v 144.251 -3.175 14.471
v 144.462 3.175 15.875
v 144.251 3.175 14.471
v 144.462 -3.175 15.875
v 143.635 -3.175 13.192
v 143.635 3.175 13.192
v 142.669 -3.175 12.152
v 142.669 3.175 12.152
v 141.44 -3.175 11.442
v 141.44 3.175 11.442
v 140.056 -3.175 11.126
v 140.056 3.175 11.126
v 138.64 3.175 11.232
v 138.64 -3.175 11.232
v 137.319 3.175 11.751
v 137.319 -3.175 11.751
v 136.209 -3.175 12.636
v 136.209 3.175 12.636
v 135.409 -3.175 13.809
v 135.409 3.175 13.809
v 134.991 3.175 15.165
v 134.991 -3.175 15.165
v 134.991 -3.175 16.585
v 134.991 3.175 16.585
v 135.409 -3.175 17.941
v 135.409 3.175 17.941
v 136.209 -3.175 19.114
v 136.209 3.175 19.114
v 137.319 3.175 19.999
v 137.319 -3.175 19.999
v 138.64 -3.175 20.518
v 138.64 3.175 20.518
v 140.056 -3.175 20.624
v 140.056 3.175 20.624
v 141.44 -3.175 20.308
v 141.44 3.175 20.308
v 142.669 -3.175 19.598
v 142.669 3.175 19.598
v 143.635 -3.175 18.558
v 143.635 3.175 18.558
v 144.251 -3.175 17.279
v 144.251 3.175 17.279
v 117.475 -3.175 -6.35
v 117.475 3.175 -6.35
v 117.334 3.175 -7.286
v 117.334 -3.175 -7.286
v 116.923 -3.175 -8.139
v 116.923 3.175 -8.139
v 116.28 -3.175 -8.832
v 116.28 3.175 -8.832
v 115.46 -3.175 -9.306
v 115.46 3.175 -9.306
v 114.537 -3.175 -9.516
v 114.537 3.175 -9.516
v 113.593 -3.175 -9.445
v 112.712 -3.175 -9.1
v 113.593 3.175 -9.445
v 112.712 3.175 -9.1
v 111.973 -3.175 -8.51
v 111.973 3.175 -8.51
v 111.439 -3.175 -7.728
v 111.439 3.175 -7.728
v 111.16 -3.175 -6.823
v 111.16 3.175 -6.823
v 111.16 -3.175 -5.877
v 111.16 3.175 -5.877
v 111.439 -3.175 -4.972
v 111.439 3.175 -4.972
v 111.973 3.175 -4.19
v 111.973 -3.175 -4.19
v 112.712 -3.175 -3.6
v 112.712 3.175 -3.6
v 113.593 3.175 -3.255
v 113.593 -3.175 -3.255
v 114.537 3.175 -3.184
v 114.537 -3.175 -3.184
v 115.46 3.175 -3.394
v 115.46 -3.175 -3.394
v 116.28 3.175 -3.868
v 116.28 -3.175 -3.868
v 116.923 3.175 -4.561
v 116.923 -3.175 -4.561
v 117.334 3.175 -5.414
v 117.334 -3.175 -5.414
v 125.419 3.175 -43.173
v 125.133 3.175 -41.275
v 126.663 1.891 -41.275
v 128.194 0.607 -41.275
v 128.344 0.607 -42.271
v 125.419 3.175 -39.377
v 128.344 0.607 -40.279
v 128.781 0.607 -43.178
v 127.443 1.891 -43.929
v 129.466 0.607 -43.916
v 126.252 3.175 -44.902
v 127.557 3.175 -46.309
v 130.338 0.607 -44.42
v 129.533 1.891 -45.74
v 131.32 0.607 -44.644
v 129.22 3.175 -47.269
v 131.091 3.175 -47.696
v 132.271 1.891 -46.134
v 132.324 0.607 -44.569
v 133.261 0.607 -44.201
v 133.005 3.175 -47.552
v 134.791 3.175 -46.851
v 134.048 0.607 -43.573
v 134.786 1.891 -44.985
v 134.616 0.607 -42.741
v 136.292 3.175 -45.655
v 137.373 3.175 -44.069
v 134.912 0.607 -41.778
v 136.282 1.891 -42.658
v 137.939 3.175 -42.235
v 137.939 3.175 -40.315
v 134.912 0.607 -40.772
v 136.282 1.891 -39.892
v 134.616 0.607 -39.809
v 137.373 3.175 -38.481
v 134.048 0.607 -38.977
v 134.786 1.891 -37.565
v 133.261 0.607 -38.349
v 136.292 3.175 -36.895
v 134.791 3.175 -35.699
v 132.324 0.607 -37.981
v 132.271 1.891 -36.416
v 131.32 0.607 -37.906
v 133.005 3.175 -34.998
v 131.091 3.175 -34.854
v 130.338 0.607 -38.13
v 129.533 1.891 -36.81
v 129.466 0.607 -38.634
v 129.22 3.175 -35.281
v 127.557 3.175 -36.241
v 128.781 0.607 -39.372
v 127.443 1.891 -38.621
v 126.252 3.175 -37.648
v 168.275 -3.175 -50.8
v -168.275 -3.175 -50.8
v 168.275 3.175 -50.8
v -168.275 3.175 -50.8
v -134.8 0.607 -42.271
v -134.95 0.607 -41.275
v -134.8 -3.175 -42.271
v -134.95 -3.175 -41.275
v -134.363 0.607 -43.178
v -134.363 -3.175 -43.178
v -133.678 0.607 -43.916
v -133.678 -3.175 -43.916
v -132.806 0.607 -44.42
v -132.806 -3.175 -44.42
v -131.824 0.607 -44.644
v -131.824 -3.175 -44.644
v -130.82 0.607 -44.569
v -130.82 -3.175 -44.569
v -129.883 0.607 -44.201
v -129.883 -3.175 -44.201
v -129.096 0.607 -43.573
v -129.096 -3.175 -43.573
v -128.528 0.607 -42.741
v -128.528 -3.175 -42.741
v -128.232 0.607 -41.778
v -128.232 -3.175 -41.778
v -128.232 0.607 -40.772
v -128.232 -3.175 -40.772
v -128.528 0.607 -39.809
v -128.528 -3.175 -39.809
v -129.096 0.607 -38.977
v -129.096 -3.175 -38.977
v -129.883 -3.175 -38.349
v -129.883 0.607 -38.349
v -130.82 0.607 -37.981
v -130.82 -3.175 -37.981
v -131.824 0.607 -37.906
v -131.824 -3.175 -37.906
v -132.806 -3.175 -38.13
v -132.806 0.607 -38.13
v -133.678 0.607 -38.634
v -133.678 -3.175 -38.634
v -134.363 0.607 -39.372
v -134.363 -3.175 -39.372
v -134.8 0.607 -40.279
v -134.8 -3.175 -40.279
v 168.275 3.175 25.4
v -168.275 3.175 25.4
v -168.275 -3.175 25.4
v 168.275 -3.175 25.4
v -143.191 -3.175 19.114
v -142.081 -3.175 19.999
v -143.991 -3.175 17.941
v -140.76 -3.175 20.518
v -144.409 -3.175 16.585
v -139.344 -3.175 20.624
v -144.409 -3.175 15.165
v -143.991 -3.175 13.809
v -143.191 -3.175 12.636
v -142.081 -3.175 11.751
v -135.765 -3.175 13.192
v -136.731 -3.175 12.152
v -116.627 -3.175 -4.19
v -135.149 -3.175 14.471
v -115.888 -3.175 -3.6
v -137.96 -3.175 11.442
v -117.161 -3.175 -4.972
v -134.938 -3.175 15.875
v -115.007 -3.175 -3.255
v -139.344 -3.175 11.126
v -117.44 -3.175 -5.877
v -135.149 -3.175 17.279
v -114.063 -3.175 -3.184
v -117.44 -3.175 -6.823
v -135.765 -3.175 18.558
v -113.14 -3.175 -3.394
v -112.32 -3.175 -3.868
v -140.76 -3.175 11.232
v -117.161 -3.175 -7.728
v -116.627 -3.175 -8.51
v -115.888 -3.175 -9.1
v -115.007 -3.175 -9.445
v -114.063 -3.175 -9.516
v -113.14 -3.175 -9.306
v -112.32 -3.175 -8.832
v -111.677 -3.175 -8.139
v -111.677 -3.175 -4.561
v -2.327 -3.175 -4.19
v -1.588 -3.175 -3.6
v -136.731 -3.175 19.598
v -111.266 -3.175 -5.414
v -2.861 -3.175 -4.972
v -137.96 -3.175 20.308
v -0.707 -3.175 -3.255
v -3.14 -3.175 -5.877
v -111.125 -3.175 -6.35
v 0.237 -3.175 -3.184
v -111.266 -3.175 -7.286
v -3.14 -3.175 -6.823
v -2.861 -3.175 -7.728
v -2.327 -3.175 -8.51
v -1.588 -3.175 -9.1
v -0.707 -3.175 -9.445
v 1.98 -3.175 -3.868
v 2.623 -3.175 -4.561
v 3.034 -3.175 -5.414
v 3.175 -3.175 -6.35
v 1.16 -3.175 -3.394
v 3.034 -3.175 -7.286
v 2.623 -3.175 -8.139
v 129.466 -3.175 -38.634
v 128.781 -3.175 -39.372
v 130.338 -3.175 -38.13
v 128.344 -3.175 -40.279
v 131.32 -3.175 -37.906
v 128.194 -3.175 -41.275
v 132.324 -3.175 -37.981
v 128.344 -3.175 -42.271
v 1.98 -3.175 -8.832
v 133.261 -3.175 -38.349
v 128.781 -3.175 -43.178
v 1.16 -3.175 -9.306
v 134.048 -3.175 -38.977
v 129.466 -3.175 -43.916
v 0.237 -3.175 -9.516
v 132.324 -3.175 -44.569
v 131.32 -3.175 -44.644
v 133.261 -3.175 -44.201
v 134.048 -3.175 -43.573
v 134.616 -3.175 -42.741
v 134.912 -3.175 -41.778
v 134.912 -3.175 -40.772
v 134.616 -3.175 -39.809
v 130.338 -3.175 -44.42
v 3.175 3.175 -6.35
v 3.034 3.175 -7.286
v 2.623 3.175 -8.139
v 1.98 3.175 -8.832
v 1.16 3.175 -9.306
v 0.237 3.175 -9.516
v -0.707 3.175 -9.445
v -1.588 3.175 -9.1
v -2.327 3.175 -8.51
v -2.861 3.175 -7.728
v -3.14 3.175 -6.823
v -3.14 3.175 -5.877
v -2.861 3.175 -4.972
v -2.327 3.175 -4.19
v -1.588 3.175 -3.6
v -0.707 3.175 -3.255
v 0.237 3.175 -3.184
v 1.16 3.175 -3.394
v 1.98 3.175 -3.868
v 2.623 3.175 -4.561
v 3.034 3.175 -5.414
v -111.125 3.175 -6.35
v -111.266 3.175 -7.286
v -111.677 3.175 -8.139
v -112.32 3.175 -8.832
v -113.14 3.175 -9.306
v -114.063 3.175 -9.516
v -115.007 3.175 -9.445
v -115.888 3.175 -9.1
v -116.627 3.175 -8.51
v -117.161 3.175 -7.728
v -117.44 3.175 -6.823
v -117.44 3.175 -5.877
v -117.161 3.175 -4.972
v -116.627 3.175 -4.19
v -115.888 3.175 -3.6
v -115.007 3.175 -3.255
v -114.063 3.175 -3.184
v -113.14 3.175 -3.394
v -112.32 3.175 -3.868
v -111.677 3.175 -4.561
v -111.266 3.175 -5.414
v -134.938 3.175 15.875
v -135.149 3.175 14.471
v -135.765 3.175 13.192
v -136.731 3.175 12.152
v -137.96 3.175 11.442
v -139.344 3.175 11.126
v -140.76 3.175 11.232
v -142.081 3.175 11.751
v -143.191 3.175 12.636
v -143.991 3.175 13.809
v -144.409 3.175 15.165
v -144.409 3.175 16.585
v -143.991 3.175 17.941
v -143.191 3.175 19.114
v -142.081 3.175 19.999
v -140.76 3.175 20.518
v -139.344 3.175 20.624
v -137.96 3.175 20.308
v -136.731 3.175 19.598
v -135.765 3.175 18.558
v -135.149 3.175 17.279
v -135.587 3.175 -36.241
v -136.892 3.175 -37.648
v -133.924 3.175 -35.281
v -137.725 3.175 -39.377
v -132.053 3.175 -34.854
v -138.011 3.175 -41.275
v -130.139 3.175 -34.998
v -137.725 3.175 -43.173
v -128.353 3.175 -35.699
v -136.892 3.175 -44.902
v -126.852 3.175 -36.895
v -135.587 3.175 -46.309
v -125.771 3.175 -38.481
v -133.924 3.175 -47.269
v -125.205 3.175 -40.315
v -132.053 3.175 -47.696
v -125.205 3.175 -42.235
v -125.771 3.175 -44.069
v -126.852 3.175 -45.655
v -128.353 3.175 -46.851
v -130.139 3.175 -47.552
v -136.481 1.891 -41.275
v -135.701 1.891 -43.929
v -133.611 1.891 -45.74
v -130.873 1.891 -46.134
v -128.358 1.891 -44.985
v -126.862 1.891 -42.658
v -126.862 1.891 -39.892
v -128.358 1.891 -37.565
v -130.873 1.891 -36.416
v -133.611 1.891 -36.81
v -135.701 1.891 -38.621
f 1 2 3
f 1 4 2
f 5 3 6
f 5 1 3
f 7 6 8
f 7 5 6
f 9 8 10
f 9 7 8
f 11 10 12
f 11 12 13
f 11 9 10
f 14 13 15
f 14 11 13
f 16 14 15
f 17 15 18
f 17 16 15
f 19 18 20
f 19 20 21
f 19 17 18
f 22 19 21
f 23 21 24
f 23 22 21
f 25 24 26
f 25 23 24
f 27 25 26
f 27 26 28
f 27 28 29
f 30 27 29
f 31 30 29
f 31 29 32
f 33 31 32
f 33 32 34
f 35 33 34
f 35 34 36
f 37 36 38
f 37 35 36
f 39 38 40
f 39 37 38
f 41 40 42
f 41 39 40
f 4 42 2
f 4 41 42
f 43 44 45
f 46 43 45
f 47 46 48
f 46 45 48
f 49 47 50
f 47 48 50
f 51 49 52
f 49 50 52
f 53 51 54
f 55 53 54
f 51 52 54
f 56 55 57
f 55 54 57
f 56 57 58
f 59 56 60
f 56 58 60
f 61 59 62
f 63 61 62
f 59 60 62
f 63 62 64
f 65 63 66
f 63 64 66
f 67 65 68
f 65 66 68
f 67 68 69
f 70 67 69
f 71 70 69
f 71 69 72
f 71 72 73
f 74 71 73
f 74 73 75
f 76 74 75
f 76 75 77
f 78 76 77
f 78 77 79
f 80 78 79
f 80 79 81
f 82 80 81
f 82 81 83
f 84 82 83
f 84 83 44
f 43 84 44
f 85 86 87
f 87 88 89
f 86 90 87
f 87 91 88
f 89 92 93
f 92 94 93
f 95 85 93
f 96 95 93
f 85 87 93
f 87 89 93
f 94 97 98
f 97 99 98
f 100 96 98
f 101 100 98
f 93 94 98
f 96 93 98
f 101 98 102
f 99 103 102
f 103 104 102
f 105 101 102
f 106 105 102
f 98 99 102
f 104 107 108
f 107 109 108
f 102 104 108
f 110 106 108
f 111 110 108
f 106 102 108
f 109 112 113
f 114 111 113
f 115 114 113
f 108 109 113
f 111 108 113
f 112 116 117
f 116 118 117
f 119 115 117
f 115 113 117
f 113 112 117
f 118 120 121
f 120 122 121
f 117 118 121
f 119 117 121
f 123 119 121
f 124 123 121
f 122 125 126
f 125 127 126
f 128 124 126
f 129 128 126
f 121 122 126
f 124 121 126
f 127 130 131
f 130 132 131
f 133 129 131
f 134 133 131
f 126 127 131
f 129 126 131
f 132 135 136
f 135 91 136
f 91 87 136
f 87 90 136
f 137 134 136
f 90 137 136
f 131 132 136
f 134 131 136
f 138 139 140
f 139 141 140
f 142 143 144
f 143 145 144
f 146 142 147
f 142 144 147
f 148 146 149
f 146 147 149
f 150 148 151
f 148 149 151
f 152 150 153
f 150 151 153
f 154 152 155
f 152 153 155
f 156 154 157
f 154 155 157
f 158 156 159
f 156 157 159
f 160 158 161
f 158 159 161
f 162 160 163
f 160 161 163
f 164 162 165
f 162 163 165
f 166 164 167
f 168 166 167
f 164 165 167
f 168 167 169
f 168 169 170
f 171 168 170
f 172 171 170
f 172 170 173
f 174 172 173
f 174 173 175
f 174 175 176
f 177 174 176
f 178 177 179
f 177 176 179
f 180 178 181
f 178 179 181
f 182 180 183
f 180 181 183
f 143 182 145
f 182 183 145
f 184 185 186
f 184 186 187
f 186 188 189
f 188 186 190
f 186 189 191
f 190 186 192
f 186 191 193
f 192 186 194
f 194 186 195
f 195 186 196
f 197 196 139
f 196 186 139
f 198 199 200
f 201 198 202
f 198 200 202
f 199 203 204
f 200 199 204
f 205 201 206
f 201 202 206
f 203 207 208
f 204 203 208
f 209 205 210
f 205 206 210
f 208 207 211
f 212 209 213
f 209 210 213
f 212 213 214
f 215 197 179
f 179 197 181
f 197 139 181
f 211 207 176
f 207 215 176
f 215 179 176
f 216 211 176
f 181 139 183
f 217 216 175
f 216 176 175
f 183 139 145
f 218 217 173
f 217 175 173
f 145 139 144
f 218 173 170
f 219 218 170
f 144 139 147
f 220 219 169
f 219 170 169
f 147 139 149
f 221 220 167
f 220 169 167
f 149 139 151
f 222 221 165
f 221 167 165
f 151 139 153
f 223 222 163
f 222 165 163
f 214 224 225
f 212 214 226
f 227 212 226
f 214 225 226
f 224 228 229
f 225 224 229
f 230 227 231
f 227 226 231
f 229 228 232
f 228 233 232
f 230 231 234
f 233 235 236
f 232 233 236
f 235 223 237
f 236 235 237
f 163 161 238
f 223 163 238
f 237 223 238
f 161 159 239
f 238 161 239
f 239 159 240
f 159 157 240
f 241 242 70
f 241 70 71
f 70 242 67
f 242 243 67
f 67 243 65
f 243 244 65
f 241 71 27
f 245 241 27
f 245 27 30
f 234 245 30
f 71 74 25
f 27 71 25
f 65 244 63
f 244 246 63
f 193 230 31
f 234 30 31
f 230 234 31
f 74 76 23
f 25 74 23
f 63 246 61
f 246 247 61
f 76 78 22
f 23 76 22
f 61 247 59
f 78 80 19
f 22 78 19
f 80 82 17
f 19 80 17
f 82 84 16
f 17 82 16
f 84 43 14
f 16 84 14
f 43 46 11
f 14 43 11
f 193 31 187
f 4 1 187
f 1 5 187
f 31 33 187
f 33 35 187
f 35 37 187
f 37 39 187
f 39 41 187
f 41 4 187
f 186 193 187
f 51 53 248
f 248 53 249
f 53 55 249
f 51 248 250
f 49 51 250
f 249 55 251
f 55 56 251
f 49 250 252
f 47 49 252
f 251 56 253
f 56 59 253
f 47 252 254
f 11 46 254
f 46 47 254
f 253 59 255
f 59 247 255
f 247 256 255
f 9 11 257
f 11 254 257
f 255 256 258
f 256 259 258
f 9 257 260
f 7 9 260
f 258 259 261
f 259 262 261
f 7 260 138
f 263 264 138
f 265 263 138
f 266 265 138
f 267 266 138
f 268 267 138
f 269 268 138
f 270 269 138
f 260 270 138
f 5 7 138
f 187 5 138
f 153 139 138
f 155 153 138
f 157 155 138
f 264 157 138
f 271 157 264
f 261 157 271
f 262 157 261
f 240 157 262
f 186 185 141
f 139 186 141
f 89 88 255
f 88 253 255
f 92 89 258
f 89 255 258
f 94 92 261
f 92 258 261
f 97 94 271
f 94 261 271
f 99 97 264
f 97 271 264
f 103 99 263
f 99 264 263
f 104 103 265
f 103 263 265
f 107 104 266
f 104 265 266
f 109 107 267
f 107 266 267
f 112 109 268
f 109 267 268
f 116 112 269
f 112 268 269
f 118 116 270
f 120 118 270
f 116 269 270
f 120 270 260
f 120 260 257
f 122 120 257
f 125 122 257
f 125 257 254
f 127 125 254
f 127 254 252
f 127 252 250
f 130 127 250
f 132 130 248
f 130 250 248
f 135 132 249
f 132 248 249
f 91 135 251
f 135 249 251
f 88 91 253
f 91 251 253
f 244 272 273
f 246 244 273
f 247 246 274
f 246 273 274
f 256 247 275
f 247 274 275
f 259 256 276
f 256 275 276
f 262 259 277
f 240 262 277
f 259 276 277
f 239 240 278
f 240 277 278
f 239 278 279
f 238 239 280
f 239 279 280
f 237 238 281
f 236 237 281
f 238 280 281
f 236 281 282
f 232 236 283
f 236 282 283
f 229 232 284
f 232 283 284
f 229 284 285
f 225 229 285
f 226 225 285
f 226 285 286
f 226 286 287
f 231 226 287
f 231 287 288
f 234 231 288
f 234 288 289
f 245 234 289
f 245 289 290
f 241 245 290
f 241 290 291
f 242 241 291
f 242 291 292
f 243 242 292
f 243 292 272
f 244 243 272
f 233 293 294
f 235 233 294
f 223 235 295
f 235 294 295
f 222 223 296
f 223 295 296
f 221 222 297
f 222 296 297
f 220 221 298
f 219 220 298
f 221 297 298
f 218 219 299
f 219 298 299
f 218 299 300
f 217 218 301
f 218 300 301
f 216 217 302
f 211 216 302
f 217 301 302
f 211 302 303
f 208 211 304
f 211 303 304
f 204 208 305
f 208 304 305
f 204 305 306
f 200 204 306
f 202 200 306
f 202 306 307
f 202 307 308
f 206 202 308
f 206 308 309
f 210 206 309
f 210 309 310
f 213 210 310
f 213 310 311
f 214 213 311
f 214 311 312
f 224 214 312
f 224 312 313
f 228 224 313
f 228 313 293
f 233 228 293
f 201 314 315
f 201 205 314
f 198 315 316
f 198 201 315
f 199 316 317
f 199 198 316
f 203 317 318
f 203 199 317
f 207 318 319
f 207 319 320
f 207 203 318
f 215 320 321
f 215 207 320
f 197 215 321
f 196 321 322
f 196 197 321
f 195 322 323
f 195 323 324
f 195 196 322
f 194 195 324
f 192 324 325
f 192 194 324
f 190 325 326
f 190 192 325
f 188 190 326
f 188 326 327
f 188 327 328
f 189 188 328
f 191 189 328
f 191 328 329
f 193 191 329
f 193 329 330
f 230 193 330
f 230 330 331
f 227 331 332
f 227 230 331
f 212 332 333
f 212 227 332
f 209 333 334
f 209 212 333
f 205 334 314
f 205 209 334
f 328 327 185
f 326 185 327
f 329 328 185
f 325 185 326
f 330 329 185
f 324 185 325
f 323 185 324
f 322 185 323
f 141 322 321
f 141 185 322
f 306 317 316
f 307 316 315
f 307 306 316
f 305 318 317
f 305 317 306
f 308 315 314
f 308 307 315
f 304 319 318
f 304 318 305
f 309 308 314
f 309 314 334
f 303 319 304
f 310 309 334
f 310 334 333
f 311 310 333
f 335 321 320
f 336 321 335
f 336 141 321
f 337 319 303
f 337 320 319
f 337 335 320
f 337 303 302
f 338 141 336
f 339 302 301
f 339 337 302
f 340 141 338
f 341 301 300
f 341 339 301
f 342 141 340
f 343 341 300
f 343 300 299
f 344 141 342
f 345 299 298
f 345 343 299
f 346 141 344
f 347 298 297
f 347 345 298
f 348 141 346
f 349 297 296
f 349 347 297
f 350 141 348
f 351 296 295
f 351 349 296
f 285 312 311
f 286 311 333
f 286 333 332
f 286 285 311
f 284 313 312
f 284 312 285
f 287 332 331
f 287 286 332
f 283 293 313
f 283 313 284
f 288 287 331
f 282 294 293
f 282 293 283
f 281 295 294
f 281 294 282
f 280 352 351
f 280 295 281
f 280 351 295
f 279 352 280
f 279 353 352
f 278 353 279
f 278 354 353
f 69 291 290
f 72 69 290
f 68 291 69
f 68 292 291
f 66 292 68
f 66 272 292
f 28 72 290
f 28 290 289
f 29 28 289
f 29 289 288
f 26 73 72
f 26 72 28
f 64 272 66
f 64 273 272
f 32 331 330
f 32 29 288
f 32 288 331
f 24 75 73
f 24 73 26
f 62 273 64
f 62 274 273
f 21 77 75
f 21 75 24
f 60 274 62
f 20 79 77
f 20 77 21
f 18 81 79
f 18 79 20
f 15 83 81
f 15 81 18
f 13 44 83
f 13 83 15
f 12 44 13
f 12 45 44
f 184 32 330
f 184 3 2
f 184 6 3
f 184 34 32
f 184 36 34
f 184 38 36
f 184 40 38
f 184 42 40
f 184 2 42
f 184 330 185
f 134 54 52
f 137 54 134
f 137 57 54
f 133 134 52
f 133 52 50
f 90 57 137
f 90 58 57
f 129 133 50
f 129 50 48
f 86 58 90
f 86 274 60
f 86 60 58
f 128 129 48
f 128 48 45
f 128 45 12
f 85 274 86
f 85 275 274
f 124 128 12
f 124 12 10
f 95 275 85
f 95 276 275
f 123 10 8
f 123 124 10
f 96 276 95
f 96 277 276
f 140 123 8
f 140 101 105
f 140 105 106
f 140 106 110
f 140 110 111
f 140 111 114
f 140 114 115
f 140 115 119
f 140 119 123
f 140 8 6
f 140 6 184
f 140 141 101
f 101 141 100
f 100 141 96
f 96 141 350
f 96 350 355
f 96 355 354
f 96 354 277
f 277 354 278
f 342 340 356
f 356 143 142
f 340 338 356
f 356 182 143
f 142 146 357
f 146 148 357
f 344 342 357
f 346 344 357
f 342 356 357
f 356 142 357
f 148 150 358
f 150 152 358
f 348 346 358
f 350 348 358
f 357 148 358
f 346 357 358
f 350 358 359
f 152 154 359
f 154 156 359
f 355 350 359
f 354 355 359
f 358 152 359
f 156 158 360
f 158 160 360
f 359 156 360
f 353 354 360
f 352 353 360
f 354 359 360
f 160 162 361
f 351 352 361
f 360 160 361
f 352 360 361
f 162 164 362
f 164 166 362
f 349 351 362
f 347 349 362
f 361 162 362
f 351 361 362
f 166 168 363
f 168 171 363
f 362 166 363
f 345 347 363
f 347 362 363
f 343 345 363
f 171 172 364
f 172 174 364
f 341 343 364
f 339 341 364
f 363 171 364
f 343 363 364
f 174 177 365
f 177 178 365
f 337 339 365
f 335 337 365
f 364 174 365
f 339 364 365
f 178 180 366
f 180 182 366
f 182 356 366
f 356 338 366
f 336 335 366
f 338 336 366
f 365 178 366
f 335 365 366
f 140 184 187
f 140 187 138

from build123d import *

# Parameters (mm, degrees)
SKETCH1_W                                           = 336.55
SKETCH1_H                                           = 76.2
SKETCH1_R                                           = 4.7625
SKETCH1_R_2                                         = 3.175
BOSS_EXTRUDE1_DEPTH                                 = 3.175
CSK_FOR_1_4_FLAT_HEAD_MACHINE_SCREW_100_D           = 6.7564
CSK_FOR_1_4_FLAT_HEAD_MACHINE_SCREW_100_CSINK_D     = 12.8778
CSK_FOR_1_4_FLAT_HEAD_MACHINE_SCREW_100_CSINK_ANGLE = 100
SKETCH5_R                                           = 3.175
CUT_EXTRUDE2_DEPTH                                  = 1
CUT_EXTRUDE2_DEPTH_BACK                             = 7.35


with BuildPart() as part:
    # Sketch1 → Boss-Extrude1 (new body, symmetric)
    with BuildSketch(Plane(origin=(0, 0, 0), x_dir=(1, 0, 0), z_dir=(0, 1, 0))):
        with Locations((0, 12.7)):
            Rectangle(SKETCH1_W, SKETCH1_H)
        with Locations((-139.7, -15.875)):
            Circle(SKETCH1_R, mode=Mode.SUBTRACT)
        with Locations((139.7, -15.875)):
            Circle(SKETCH1_R, mode=Mode.SUBTRACT)
        with Locations((131.572, 41.275)):
            Circle(SKETCH1_R_2, mode=Mode.SUBTRACT)
        with Locations((-131.572, 41.275)):
            Circle(SKETCH1_R_2, mode=Mode.SUBTRACT)
    extrude(amount=BOSS_EXTRUDE1_DEPTH, both=True)

    # CSK for 1/4 Flat Head Machine Screw (100)1 (through all)
    with Locations(Plane(origin=(0, 3.175, 0), x_dir=(1, 0, 0), z_dir=(0, 1, 0))):
        with Locations((-131.572, 41.275), (131.572, 41.275)):
            CounterSinkHole(CSK_FOR_1_4_FLAT_HEAD_MACHINE_SCREW_100_D / 2, CSK_FOR_1_4_FLAT_HEAD_MACHINE_SCREW_100_CSINK_D / 2, counter_sink_angle=CSK_FOR_1_4_FLAT_HEAD_MACHINE_SCREW_100_CSINK_ANGLE)

    # Sketch5 → Cut-Extrude2 (cut, two sides)
    with BuildSketch(Plane(origin=(0, 3.175, 0), x_dir=(1, 0, 0), z_dir=(0, 1, 0))) as cut_extrude2_sk:
        with Locations((-114.3, 6.35)):
            Circle(SKETCH5_R)
        with Locations((114.3, 6.35)):
            Circle(SKETCH5_R)
        with Locations((0, 6.35)):
            Circle(SKETCH5_R)
    extrude(amount=CUT_EXTRUDE2_DEPTH, mode=Mode.SUBTRACT)
    extrude(cut_extrude2_sk.sketch, amount=-CUT_EXTRUDE2_DEPTH_BACK, mode=Mode.SUBTRACT)


solid = part.part
